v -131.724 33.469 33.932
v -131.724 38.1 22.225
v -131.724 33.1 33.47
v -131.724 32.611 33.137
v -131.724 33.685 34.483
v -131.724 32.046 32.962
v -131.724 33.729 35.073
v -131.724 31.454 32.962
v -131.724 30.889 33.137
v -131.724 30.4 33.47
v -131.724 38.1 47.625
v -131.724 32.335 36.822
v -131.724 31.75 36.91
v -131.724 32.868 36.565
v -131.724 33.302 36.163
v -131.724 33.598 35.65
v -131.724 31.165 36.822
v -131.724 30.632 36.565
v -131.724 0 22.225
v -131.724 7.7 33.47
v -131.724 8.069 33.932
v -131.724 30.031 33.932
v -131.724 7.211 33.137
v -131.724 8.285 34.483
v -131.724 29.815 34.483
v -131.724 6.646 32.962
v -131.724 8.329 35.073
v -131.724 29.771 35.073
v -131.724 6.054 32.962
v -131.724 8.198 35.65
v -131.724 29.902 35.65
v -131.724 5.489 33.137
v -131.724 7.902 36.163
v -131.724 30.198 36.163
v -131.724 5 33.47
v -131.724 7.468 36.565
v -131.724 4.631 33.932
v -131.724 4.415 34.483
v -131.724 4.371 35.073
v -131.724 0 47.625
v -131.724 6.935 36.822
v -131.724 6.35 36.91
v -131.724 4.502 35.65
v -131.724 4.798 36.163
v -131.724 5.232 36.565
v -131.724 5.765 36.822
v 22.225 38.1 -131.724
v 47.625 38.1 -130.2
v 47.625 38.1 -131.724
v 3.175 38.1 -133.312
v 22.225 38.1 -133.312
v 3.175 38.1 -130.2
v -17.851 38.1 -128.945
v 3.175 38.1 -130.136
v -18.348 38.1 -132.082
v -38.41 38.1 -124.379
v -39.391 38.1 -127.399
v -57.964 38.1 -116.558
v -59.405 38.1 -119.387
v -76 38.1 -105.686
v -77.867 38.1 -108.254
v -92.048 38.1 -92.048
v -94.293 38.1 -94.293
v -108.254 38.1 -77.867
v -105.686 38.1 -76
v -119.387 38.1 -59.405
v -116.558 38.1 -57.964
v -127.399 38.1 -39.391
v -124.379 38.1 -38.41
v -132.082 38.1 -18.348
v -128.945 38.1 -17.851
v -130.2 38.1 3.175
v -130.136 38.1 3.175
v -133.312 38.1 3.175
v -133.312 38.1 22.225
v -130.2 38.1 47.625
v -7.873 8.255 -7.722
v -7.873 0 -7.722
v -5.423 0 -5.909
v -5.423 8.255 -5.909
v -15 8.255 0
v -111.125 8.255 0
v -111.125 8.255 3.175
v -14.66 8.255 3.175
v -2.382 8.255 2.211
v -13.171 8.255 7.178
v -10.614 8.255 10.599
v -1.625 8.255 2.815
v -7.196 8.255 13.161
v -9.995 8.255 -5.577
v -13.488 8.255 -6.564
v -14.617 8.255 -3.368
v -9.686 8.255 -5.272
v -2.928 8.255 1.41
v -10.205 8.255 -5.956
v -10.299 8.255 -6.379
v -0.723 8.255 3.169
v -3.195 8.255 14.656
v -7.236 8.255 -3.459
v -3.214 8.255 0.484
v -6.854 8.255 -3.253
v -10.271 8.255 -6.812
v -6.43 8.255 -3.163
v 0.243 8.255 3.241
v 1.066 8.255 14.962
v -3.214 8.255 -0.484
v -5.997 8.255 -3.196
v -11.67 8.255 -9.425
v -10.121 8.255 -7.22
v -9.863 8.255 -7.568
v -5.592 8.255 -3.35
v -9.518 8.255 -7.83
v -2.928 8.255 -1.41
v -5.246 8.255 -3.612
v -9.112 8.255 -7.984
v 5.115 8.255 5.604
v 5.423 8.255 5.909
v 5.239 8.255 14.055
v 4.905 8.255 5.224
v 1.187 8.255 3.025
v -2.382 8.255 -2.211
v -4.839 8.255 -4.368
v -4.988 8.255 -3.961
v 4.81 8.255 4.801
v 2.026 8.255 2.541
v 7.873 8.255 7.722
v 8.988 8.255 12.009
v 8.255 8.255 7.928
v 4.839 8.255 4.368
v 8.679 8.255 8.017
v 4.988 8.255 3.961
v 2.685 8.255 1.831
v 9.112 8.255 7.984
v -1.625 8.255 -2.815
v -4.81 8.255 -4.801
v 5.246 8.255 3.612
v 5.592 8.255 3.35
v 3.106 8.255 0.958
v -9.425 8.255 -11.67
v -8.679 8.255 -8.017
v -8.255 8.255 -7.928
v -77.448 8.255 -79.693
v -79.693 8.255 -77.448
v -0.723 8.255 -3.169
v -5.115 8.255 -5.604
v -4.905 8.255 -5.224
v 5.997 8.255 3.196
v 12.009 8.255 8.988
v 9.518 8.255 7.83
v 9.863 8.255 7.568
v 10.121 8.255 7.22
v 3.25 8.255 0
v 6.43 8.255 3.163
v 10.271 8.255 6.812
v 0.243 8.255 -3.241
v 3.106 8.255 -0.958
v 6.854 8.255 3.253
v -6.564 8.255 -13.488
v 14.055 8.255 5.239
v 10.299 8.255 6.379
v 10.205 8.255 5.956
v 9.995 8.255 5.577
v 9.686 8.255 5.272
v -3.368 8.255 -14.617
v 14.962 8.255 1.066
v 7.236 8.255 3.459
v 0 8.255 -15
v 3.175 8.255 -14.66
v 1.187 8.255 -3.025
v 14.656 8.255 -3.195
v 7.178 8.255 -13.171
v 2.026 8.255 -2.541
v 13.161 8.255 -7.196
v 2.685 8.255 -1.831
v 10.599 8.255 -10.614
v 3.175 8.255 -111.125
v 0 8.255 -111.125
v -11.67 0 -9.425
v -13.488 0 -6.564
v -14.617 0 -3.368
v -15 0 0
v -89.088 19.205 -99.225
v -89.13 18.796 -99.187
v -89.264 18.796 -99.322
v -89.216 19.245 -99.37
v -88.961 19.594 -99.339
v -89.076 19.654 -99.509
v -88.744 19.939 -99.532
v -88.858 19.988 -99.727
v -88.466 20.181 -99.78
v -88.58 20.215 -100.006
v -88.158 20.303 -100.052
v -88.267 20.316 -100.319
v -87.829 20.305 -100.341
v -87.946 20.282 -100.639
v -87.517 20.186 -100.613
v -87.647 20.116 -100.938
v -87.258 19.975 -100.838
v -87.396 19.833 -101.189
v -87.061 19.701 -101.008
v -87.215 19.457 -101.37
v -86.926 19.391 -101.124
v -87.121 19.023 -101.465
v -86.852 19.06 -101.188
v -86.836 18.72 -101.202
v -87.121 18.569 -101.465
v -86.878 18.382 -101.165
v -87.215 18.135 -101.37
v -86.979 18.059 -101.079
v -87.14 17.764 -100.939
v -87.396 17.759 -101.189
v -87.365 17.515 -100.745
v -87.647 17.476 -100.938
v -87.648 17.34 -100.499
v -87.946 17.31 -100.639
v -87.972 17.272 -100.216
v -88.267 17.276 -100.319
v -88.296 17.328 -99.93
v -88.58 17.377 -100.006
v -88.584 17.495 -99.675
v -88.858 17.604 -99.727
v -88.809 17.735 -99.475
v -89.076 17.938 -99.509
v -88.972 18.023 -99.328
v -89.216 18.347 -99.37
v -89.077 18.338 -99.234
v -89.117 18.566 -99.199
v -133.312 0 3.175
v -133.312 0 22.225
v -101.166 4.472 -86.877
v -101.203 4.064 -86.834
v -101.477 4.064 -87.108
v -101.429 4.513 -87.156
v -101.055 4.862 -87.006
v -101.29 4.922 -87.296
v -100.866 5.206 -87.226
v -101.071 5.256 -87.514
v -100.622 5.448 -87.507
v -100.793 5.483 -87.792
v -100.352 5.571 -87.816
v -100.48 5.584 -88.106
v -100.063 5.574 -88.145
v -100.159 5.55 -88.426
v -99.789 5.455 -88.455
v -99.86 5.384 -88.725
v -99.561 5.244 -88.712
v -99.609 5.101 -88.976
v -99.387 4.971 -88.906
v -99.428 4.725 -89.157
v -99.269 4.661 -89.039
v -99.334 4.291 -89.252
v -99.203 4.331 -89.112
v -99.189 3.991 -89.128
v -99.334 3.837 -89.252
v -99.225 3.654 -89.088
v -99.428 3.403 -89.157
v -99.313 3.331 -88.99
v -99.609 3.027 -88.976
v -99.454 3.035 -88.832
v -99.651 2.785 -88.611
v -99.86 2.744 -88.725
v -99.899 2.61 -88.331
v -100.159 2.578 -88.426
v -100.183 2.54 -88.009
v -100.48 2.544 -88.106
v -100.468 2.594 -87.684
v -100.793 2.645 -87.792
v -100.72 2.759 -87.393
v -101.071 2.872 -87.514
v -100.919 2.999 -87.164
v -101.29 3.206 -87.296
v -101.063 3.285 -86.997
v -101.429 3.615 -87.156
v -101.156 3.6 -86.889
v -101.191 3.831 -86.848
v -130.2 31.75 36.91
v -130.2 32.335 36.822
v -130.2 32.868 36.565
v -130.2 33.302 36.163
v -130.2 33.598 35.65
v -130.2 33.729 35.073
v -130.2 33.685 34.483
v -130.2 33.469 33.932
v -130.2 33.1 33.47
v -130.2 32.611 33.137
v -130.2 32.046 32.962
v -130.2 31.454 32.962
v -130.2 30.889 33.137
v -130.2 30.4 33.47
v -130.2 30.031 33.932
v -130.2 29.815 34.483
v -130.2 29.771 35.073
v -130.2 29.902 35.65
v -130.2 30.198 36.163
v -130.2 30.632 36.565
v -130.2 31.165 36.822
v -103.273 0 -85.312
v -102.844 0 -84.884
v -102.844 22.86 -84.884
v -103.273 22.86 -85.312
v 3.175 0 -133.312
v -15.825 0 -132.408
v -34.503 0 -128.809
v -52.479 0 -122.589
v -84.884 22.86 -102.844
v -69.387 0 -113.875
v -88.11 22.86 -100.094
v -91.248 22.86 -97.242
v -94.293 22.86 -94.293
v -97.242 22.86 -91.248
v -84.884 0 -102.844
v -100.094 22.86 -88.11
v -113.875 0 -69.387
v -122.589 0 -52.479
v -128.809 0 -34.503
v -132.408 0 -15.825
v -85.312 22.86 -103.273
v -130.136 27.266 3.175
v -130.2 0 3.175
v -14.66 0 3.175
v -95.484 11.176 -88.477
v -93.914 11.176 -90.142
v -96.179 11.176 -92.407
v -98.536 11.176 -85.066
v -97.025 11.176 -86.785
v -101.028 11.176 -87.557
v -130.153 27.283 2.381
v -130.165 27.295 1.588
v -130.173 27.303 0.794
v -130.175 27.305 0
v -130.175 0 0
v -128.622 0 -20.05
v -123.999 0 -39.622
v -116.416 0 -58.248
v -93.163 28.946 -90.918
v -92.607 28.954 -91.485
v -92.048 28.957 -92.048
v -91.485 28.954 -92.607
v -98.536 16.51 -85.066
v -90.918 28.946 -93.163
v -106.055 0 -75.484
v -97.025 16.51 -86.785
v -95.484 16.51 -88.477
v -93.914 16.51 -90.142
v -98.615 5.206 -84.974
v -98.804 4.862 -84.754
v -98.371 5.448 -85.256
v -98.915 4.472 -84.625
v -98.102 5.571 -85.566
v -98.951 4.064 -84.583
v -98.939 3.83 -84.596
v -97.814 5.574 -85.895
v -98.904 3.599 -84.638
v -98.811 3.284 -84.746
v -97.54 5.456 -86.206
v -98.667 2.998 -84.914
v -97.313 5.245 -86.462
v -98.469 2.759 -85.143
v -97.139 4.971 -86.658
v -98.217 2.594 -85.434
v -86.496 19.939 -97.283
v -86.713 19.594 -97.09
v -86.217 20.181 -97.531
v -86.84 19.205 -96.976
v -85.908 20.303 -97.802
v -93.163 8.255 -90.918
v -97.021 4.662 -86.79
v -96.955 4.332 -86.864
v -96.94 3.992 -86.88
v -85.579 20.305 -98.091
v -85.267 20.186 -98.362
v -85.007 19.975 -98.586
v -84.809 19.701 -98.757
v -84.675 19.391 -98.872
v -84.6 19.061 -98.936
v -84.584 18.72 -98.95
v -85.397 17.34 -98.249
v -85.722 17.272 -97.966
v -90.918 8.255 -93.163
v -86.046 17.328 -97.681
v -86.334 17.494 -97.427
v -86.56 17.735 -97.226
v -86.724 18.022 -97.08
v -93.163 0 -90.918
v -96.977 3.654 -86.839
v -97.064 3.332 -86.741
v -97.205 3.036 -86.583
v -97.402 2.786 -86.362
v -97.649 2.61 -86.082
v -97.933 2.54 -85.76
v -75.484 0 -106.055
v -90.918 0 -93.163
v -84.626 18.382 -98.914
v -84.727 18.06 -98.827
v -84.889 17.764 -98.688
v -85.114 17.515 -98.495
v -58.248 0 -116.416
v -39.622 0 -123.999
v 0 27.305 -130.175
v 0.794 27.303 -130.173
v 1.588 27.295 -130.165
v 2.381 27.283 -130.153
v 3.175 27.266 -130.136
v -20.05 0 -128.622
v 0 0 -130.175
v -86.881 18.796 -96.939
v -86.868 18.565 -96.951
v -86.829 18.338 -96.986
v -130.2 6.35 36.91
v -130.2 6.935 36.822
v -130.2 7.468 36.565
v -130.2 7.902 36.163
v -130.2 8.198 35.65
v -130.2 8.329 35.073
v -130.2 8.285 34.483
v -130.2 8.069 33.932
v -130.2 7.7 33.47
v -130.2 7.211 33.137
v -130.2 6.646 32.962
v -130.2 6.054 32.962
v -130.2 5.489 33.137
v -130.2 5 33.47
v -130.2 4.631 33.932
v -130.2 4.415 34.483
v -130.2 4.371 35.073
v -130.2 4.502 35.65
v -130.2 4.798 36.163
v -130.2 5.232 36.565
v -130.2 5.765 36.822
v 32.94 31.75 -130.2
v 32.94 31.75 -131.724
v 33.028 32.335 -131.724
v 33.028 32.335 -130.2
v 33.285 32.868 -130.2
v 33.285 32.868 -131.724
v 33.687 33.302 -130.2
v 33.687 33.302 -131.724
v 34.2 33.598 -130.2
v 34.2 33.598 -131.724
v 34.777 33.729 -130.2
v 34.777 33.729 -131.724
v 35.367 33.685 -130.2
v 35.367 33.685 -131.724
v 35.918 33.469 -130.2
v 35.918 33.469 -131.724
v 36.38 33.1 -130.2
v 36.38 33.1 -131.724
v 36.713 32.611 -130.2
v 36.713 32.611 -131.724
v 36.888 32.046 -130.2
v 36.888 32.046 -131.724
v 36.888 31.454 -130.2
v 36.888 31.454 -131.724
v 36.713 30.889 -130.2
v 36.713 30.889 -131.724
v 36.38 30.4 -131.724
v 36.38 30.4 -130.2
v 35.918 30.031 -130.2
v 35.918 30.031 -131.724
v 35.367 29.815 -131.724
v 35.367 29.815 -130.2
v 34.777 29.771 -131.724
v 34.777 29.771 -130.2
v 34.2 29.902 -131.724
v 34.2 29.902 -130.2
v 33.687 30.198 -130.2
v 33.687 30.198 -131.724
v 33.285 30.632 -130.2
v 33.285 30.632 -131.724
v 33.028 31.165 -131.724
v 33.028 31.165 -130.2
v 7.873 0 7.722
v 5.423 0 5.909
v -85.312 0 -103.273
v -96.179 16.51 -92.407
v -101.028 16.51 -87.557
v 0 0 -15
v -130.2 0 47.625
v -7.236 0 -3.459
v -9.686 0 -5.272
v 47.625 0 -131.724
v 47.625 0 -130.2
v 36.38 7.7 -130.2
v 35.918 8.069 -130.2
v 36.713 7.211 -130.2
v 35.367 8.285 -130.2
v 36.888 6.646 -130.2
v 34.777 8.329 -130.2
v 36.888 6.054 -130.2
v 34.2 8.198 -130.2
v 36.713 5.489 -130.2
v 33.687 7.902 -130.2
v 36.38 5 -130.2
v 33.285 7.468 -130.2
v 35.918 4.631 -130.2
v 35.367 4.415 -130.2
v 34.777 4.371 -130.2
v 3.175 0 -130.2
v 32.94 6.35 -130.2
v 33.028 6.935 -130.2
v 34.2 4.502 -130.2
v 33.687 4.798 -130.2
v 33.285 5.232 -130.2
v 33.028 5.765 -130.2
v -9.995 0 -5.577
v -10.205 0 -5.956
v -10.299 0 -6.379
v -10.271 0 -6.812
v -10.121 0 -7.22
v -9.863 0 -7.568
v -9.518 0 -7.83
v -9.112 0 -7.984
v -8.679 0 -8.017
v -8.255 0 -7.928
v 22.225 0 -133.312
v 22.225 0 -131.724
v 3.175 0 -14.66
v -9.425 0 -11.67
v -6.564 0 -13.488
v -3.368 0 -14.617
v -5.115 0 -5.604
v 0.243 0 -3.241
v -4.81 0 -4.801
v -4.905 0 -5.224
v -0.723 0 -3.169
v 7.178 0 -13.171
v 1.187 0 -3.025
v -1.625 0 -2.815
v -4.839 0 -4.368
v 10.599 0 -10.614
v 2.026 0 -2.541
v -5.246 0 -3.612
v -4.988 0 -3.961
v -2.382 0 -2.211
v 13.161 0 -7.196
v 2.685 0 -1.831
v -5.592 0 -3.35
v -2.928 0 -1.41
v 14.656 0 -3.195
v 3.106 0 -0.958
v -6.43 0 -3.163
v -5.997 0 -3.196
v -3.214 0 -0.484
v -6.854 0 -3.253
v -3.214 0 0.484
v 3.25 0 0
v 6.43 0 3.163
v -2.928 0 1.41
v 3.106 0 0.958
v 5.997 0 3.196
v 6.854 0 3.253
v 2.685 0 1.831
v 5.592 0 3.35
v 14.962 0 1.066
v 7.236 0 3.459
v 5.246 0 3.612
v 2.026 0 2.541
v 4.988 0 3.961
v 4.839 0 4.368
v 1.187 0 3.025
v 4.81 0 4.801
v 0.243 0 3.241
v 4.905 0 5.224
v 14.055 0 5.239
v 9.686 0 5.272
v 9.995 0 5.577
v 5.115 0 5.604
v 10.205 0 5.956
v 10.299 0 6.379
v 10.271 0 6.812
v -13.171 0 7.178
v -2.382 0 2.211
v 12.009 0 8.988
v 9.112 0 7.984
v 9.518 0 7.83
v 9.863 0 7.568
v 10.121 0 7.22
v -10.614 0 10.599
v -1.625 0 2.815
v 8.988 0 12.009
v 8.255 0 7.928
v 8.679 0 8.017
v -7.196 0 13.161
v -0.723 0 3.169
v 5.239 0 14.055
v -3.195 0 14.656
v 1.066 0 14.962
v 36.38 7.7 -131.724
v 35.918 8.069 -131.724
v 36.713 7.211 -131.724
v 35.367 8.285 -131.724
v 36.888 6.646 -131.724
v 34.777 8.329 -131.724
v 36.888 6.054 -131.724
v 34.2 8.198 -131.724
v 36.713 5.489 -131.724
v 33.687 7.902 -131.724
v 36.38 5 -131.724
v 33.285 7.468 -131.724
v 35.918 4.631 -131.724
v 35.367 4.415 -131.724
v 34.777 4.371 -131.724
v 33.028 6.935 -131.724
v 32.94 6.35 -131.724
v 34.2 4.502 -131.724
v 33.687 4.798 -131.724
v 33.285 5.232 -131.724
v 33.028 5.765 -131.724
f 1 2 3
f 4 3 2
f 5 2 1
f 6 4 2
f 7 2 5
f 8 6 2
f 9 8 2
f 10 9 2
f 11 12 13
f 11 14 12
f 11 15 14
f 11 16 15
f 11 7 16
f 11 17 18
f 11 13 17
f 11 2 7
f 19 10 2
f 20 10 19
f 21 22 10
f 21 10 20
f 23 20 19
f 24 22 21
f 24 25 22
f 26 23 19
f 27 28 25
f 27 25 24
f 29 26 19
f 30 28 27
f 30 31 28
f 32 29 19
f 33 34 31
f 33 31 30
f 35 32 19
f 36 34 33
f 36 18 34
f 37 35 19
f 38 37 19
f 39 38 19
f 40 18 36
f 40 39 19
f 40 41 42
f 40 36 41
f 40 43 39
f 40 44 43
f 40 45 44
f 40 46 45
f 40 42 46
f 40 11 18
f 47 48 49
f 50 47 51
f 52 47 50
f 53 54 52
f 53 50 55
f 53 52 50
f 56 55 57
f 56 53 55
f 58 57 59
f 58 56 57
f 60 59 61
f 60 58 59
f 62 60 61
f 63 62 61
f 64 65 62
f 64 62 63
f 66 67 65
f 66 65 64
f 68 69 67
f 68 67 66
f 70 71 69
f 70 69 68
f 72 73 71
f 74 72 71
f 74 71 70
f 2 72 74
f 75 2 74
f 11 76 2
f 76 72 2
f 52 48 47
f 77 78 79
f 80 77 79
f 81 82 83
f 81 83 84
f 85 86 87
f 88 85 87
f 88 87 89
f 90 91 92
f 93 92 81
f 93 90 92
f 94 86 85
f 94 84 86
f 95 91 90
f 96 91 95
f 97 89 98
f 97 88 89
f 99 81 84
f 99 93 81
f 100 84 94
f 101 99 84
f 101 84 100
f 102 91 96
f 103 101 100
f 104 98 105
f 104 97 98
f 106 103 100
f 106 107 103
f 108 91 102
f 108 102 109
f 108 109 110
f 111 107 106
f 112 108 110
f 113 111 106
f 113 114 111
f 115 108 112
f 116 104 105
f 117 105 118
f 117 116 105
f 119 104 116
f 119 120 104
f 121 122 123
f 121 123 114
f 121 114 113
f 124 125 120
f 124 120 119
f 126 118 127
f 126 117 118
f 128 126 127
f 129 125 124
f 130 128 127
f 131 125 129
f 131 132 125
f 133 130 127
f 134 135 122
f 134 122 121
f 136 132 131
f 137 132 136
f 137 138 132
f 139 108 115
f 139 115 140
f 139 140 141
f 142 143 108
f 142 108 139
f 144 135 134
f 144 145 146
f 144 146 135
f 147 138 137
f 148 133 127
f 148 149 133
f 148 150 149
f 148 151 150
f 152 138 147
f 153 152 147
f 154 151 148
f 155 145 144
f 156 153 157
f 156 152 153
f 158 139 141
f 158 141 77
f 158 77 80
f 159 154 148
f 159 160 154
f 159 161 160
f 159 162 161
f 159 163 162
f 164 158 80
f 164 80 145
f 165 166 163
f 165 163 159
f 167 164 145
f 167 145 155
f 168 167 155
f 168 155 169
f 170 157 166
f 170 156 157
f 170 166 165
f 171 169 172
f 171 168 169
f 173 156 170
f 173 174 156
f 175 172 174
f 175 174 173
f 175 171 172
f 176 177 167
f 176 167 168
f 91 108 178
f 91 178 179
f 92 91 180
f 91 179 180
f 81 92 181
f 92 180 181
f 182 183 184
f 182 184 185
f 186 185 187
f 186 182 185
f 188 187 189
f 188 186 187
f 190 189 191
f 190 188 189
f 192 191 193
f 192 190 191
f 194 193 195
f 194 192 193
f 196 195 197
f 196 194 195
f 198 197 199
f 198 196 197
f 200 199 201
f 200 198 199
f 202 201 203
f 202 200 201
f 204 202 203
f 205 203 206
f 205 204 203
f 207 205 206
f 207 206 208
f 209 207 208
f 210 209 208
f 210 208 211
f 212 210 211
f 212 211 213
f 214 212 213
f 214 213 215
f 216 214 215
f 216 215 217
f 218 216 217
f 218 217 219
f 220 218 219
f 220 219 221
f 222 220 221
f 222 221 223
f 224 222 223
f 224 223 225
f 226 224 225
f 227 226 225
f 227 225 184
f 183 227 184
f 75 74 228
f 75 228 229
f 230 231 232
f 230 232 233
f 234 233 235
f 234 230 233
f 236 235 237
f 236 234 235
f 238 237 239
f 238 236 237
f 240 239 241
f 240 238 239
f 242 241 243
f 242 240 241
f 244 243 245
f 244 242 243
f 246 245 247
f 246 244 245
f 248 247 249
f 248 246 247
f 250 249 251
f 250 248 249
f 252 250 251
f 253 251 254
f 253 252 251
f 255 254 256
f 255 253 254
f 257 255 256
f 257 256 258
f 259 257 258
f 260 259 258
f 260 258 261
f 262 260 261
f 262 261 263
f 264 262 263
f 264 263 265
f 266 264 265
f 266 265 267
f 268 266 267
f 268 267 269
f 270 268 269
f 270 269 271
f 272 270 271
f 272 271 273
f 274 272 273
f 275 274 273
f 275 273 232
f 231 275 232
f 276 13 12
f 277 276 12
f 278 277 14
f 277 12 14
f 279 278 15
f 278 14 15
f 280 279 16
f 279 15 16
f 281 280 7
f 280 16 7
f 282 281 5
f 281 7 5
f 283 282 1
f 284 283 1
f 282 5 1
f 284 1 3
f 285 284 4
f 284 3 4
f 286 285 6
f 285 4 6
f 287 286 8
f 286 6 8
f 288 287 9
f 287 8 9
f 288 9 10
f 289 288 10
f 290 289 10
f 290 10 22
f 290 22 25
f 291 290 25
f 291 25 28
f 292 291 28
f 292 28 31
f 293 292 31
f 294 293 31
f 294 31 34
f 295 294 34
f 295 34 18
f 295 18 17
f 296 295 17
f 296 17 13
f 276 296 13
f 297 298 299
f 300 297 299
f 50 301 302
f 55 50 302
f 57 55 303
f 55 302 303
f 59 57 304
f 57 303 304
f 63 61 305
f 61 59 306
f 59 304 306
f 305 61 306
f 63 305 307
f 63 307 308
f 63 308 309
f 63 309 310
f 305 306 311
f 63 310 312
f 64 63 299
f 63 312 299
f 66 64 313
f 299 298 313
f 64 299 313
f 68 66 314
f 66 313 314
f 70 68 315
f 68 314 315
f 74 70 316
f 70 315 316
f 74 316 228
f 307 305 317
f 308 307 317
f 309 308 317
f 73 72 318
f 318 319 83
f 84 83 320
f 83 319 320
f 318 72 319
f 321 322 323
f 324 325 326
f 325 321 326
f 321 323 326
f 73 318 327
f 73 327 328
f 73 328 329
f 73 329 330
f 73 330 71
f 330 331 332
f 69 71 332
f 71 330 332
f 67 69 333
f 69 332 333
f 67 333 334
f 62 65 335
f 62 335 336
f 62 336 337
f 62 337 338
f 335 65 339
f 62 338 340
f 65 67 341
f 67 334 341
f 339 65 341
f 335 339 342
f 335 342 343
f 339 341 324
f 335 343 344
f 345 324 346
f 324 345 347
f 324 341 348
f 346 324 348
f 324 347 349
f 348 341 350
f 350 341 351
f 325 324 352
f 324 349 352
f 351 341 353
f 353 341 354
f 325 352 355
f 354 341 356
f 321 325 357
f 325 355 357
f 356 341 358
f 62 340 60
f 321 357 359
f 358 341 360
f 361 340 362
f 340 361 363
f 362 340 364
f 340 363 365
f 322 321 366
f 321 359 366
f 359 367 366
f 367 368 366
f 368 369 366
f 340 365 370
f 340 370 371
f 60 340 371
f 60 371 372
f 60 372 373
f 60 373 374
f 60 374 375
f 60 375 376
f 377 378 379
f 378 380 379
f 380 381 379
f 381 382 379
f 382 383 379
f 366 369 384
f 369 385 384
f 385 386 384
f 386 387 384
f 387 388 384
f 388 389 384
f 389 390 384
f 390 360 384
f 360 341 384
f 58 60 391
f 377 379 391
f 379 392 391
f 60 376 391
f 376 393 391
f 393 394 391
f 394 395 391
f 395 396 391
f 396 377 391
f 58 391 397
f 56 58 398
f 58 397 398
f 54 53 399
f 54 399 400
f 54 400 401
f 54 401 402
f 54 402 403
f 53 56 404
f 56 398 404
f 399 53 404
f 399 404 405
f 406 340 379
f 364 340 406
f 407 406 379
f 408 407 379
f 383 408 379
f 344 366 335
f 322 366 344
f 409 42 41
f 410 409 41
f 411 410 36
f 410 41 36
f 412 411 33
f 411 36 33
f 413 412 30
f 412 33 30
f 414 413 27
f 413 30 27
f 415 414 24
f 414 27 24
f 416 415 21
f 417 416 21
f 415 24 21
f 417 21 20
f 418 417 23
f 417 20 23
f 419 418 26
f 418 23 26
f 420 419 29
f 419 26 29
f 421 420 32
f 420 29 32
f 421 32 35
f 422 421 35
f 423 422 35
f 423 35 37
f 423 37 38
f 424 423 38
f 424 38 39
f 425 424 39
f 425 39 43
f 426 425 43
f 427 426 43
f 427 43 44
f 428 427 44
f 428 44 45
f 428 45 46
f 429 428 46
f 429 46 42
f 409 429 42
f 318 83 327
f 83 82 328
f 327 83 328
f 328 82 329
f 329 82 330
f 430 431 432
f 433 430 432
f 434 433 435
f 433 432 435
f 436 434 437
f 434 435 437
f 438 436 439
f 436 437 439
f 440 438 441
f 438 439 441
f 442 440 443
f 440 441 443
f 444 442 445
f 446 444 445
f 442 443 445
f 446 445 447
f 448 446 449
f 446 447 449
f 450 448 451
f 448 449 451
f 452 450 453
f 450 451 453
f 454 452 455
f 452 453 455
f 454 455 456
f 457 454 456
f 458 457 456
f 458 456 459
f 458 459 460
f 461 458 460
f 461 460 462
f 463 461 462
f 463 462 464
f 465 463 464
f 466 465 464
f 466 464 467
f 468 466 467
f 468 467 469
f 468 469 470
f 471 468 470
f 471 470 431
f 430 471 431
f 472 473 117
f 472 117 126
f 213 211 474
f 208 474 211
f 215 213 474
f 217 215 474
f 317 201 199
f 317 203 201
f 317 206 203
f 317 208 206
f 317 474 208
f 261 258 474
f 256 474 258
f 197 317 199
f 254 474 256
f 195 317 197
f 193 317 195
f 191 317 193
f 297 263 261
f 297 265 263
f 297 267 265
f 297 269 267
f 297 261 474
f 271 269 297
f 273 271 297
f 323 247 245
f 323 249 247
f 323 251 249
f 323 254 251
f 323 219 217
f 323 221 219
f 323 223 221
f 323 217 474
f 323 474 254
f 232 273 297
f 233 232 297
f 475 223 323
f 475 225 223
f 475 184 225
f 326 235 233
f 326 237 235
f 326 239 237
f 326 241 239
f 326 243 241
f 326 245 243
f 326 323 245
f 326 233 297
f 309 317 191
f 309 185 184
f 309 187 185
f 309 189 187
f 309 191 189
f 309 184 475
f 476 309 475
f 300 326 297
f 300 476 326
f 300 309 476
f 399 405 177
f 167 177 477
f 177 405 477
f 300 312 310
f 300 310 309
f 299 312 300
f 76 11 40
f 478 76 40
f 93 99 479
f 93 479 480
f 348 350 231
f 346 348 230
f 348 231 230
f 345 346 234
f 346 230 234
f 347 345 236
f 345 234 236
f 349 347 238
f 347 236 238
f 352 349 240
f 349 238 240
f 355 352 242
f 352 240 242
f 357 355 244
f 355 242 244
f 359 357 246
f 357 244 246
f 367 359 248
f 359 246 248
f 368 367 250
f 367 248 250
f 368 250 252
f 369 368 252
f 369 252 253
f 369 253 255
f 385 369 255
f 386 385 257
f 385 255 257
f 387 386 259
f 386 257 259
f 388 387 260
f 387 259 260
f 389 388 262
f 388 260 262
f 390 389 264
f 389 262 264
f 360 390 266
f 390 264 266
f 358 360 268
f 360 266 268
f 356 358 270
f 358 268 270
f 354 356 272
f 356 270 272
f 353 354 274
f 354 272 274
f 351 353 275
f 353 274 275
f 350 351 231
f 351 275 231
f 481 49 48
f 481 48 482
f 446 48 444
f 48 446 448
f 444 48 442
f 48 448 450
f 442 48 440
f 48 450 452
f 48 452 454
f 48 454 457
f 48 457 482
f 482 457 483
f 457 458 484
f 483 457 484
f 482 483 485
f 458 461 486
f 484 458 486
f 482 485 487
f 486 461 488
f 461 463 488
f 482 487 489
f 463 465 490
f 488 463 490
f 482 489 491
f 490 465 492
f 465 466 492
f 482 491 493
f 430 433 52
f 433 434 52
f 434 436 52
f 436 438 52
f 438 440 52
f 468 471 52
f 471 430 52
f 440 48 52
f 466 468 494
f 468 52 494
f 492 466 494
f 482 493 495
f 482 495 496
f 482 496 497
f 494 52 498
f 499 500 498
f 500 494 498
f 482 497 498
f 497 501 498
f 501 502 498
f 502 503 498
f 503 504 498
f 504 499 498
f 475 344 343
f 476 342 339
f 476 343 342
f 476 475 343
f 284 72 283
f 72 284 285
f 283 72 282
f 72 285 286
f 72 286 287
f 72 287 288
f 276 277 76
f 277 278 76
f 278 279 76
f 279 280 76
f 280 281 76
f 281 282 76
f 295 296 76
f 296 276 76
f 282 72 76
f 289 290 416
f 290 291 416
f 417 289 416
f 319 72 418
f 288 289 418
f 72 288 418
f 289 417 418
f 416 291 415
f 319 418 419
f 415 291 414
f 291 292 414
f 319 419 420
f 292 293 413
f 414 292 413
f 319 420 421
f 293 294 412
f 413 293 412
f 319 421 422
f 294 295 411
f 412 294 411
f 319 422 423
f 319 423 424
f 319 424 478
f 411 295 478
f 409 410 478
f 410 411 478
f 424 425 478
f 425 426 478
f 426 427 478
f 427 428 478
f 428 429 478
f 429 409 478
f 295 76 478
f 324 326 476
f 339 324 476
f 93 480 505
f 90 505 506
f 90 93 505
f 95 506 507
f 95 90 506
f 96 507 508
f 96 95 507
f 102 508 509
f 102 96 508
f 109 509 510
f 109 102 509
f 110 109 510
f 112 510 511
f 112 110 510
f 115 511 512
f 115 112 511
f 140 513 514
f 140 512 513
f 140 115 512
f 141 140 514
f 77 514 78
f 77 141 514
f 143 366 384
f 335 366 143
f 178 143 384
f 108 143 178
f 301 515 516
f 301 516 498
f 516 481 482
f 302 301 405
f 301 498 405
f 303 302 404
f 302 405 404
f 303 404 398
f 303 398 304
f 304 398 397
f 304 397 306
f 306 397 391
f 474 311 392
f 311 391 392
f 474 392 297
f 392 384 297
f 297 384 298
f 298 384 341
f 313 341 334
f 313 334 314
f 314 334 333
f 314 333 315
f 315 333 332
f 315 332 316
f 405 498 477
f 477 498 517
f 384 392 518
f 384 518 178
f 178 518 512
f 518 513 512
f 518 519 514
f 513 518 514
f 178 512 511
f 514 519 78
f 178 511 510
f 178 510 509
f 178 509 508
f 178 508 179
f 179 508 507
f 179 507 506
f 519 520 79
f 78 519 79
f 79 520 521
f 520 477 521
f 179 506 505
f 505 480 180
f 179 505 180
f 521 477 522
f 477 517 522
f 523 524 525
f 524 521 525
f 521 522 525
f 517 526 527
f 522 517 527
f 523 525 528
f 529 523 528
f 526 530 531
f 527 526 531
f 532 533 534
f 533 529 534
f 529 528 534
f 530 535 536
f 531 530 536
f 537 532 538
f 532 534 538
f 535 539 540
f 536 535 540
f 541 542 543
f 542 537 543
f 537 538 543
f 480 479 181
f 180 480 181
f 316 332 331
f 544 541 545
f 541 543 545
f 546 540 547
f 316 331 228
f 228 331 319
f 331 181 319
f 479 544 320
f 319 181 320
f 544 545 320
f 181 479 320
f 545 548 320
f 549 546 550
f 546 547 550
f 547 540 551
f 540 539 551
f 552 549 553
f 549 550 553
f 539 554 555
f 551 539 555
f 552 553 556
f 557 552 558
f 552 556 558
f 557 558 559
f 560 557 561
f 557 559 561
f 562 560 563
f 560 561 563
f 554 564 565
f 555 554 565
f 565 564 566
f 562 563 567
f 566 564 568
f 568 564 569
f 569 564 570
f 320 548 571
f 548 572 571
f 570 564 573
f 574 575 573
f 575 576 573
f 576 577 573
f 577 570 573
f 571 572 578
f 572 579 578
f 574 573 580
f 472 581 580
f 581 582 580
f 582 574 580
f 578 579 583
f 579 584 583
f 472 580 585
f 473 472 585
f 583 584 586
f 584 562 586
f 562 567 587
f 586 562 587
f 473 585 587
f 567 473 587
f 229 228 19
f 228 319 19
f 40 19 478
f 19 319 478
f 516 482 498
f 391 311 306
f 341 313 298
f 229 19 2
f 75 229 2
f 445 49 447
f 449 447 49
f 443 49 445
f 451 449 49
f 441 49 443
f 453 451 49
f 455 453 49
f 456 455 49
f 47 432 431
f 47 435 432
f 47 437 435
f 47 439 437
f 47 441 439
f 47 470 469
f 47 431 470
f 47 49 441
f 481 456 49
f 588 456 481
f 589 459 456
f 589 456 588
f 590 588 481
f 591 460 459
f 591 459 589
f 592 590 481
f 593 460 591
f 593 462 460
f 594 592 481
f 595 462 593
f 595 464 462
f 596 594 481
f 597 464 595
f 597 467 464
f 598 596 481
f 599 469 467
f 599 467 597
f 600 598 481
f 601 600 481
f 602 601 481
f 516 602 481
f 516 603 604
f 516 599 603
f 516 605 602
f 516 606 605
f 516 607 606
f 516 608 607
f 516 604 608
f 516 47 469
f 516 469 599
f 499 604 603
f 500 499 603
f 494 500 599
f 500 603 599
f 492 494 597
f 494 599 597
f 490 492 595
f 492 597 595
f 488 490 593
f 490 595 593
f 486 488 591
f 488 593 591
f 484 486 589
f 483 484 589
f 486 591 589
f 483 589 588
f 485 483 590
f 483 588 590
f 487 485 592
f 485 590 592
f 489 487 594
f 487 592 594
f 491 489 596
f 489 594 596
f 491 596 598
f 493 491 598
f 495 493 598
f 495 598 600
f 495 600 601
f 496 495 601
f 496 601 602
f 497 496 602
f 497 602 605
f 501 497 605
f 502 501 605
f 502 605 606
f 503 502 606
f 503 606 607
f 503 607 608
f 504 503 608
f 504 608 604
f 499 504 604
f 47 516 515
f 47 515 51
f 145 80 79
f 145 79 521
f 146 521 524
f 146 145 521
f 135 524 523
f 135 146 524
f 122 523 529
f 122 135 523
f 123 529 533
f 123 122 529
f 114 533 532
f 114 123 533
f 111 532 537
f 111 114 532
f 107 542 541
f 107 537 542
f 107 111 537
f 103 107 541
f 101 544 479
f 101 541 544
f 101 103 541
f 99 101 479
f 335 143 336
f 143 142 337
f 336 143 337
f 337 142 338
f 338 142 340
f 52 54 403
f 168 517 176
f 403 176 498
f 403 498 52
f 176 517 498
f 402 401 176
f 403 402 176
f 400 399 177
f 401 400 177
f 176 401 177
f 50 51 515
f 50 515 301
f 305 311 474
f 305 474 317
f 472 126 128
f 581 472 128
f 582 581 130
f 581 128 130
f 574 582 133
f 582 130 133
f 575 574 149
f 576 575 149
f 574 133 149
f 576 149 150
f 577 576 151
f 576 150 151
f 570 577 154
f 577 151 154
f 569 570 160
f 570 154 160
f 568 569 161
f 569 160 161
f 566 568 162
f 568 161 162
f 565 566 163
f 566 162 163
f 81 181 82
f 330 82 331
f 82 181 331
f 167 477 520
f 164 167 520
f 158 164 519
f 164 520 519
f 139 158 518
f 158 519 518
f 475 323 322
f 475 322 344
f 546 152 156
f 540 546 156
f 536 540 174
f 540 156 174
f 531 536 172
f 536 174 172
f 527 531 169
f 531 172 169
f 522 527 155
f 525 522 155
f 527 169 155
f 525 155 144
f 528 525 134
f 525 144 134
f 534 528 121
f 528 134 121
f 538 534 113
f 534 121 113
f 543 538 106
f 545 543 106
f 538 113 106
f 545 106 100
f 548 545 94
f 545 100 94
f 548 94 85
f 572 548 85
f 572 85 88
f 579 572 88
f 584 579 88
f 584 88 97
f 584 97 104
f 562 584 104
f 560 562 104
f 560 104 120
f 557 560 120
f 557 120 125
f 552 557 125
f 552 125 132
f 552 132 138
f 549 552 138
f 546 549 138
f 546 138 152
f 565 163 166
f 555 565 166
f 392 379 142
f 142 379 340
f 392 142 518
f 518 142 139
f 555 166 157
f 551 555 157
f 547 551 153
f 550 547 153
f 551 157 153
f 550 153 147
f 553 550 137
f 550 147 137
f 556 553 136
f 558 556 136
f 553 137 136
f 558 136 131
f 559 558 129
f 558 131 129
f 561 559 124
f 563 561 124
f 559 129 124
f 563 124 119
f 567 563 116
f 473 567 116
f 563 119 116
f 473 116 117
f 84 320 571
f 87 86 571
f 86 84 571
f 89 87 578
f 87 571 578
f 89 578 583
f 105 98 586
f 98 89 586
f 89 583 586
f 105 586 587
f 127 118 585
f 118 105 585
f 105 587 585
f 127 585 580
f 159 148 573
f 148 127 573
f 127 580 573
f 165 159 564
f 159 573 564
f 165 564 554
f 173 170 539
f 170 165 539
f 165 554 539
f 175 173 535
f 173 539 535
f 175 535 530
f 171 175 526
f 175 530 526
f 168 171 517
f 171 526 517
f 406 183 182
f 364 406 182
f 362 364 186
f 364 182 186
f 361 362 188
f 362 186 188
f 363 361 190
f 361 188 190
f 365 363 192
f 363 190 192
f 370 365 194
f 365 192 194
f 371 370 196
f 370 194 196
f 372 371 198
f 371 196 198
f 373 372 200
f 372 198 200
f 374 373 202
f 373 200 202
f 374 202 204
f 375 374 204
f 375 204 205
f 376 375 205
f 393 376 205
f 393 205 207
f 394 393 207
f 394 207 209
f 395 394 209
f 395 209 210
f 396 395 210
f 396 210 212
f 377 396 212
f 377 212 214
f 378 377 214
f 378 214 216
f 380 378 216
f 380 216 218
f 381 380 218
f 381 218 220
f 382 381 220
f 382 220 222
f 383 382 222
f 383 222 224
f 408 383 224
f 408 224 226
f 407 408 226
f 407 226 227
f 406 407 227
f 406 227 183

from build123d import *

# Parameters (mm, degrees)
SKETCH1_R            = 15
BOSS_EXTRUDE2_DEPTH  = 8.255
BOSS_EXTRUDE3_DEPTH  = 8.255
BOSS_EXTRUDE4_DEPTH  = 38.1
SKETCH5_R            = 3.249999977
CUT_EXTRUDE3_DEPTH   = 63.5
BOSS_EXTRUDE9_DEPTH  = 3.175
BOSS_EXTRUDE11_DEPTH = 3.175
BOSS_EXTRUDE14_DEPTH = 3.175
SKETCH15_W           = 38.1
SKETCH15_H           = 44.45
BOSS_EXTRUDE15_DEPTH = 1.524
SKETCH16_W           = 38.1
SKETCH16_H           = 44.45
BOSS_EXTRUDE16_DEPTH = 1.524
SKETCH17_R           = 1.98501
CUT_EXTRUDE4_DEPTH   = 2.54
SKETCH18_R           = 1.98501
CUT_EXTRUDE5_DEPTH   = 2.54
SKETCH19_W           = 19.05
SKETCH19_H           = 38.1
BOSS_EXTRUDE17_DEPTH = 1.587961
SKETCH20_W           = 19.05
SKETCH20_H           = 38.1
BOSS_EXTRUDE18_DEPTH = 1.587961
CUT_EXTRUDE6_REACH   = 202.702
SKETCH21_R           = 1.524
BOSS_EXTRUDE20_START = -0.60614
SKETCH21_3_W         = 25.4
SKETCH21_3_H         = 22.86
SKETCH21_3_R         = 1.524
BOSS_EXTRUDE20_DEPTH = 0.60614
CUT_EXTRUDE7_REACH   = 202.702
SKETCH26_W           = 6.858
SKETCH26_H           = 5.334


with BuildPart() as part:
    # Sketch1 → Boss-Extrude2 (new body)
    with BuildSketch(Plane(origin=(0, 0, 0), x_dir=(1, 0, 0), z_dir=(0, 1, 0))):
        Circle(SKETCH1_R)
    extrude(amount=BOSS_EXTRUDE2_DEPTH)

    # Sketch1<6> → Boss-Extrude3 (add)
    with BuildSketch(Plane(origin=(0, 0, 0), x_dir=(1, 0, 0), z_dir=(0, 1, 0))):
        with BuildLine():
            ThreePointArc((3.175, 130.136274728), (1.587618078, 130.165318322), (0, 130.175))
            Line((0, 130.175), (0, 15))
            ThreePointArc((0, 15), (1.596569562, 14.914790164), (3.175, 14.660128751))
            Line((3.175, 14.660128751), (3.175, 130.136274728))
        make_face()
        with BuildLine():
            Line((-9.42450178, 11.66956581), (-90.918248264, 93.163312294))
            ThreePointArc((-90.918248264, 93.163312294), (-92.047625241, 92.047625241), (-93.163312294, 90.918248264))
            Line((-93.163312294, 90.918248264), (-11.66956581, 9.42450178))
            ThreePointArc((-11.66956581, 9.42450178), (-10.606601718, 10.606601718), (-9.42450178, 11.66956581))
        make_face()
        with BuildLine():
            Line((-15, 0), (-130.175, 0))
            ThreePointArc((-130.175, 0), (-130.165318322, -1.587618078), (-130.136274728, -3.175))
            Line((-130.136274728, -3.175), (-14.660128751, -3.175))
            ThreePointArc((-14.660128751, -3.175), (-14.914790164, -1.596569562), (-15, 0))
        make_face()
    extrude(amount=BOSS_EXTRUDE3_DEPTH)

    # Sketch1<7> → Boss-Extrude4 (add)
    with BuildSketch(Plane(origin=(0, 0, 0), x_dir=(1, 0, 0), z_dir=(0, 1, 0))):
        with BuildLine():
            Line((3.175, 130.136274728), (3.175, 133.312197023))
            ThreePointArc((3.175, 133.312197023), (-94.292689271, 94.292689271), (-133.312197023, -3.175))
            Line((-133.312197023, -3.175), (-130.136274728, -3.175))
            ThreePointArc((-130.136274728, -3.175), (-92.047625241, 92.047625241), (3.175, 130.136274728))
        make_face()
    extrude(amount=BOSS_EXTRUDE4_DEPTH)

    # Sketch5 → Cut-Extrude3 (cut)
    with BuildSketch(Plane(origin=(0, 8.255, 0), x_dir=(1, 0, 0), z_dir=(0, 1, 0))):
        Circle(SKETCH5_R)
        with BuildLine():
            Line((-7.236078848, 3.458556767), (-9.686234559, 5.271576621))
            ThreePointArc((-9.686234559, 5.271576621), (-10.004802487, 7.403164404), (-7.873214705, 7.721732332))
            Line((-7.873214705, 7.721732332), (-5.423058993, 5.908712478))
            ThreePointArc((-5.423058993, 5.908712478), (-5.104491065, 3.777124696), (-7.236078848, 3.458556767))
        make_face()
        with BuildLine():
            Line((5.423058993, -5.908712478), (7.873214705, -7.721732332))
            ThreePointArc((7.873214705, -7.721732332), (10.004802487, -7.403164404), (9.686234559, -5.271576621))
            Line((9.686234559, -5.271576621), (7.236078848, -3.458556767))
            ThreePointArc((7.236078848, -3.458556767), (5.104491065, -3.777124696), (5.423058993, -5.908712478))
        make_face()
    extrude(amount=-CUT_EXTRUDE3_DEPTH, mode=Mode.SUBTRACT)

    # Sketch10 → Boss-Extrude9 (add)
    with BuildSketch(Plane(origin=(0, 0, 0), x_dir=(-1, 0, 0), z_dir=(0, 0, -1))):
        Polygon((130.175, 27.305), (130.175, 8.255), (111.125, 8.255), align=None)
    extrude(amount=-BOSS_EXTRUDE9_DEPTH)

    # Sketch13 → Boss-Extrude11 (add)
    with BuildSketch(Plane.ZY):
        Polygon((-130.175, 27.305), (-111.125, 8.255), (-130.175, 8.255), align=None)
    extrude(amount=-BOSS_EXTRUDE11_DEPTH)

    # Sketch14 → Boss-Extrude14 (add)
    with BuildSketch(Plane(origin=(1.122532015, 0, -1.122532015), x_dir=(-0.707106781, 0, -0.707106781), z_dir=(0.707106781, 0, -0.707106781))):
        Polygon((133.340319762, 8.255), (111.115319762, 8.255), (133.340319762, 32.394680238), align=None)
    extrude(amount=-BOSS_EXTRUDE14_DEPTH)

    # Sketch15 → Boss-Extrude15 (add)
    with BuildSketch(Plane(origin=(-131.724235875, 0, 0), x_dir=(0, -1, 0), z_dir=(-1, 0, 0))):
        with Locations((-19.05, 25.4)):
            Rectangle(SKETCH15_W, SKETCH15_H)
    extrude(amount=-BOSS_EXTRUDE15_DEPTH)

    # Sketch16 → Boss-Extrude16 (add)
    with BuildSketch(Plane(origin=(0, 0, -131.724235875), x_dir=(0, -1, 0), z_dir=(0, 0, -1))):
        with Locations((-19.05, -25.4)):
            Rectangle(SKETCH16_W, SKETCH16_H)
    extrude(amount=-BOSS_EXTRUDE16_DEPTH)

    # Sketch17 → Cut-Extrude4 (cut)
    with BuildSketch(Plane(origin=(0, 0, -131.724235875), x_dir=(-1, 0, 0), z_dir=(0, 0, -1))):
        with Locations((-34.925, 31.75)):
            Circle(SKETCH17_R)
        with Locations((-34.925, 6.35)):
            Circle(SKETCH17_R)
    extrude(amount=-CUT_EXTRUDE4_DEPTH, mode=Mode.SUBTRACT)

    # Sketch18 → Cut-Extrude5 (cut)
    with BuildSketch(Plane.ZY.offset(131.724235875)):
        with Locations((34.925, 31.75)):
            Circle(SKETCH18_R)
        with Locations((34.925, 6.35)):
            Circle(SKETCH18_R)
    extrude(amount=-CUT_EXTRUDE5_DEPTH, mode=Mode.SUBTRACT)

    # Sketch19 → Boss-Extrude17 (add)
    with BuildSketch(Plane.ZY.offset(131.724235875)):
        with Locations((12.7, 19.05)):
            Rectangle(SKETCH19_W, SKETCH19_H)
    extrude(amount=BOSS_EXTRUDE17_DEPTH)

    # Sketch20 → Boss-Extrude18 (add)
    with BuildSketch(Plane(origin=(0, 0, -131.724235875), x_dir=(-1, 0, 0), z_dir=(0, 0, -1))):
        with Locations((-12.7, 19.05)):
            Rectangle(SKETCH20_W, SKETCH20_H)
    extrude(amount=BOSS_EXTRUDE18_DEPTH)

    # Sketch21 → Cut-Extrude6 (cut, up to next)
    with BuildSketch(Plane(origin=(-94.292689271, 0, -94.292689271), x_dir=(-0.707106781, 0, 0.707106781), z_dir=(-0.707106781, 0, -0.707106781)), mode=Mode.PRIVATE) as cut_extrude6_sk1:
        with Locations((8.636, 4.064)):
            Circle(SKETCH21_R)
    cut_extrude6_tool1 = extrude(cut_extrude6_sk1.sketch, amount=-CUT_EXTRUDE6_REACH, mode=Mode.PRIVATE) & part.part
    add(cut_extrude6_tool1.solids().sort_by_distance((-100.399263, 4.064, -88.186115))[0], mode=Mode.SUBTRACT)
    # Sketch21 → Cut-Extrude6 (cut, up to next)
    with BuildSketch(Plane(origin=(-94.292689271, 0, -94.292689271), x_dir=(-0.707106781, 0, 0.707106781), z_dir=(-0.707106781, 0, -0.707106781)), mode=Mode.PRIVATE) as cut_extrude6_sk2:
        with Locations((-8.636, 18.796)):
            Circle(SKETCH21_R)
    cut_extrude6_tool2 = extrude(cut_extrude6_sk2.sketch, amount=-CUT_EXTRUDE6_REACH, mode=Mode.PRIVATE) & part.part
    add(cut_extrude6_tool2.solids().sort_by_distance((-88.186115, 18.796, -100.399263))[0], mode=Mode.SUBTRACT)

    # Sketch21<3> → Boss-Extrude20 (add)
    with BuildSketch(Plane(origin=(-94.292689271, 0, -94.292689271), x_dir=(-0.707106781, 0, 0.707106781), z_dir=(-0.707106781, 0, -0.707106781)).offset(BOSS_EXTRUDE20_START)):
        with Locations((0, 11.43)):
            Rectangle(SKETCH21_3_W, SKETCH21_3_H)
        with Locations((8.636, 4.064)):
            Circle(SKETCH21_3_R, mode=Mode.SUBTRACT)
        with Locations((-8.636, 18.796)):
            Circle(SKETCH21_3_R, mode=Mode.SUBTRACT)
    extrude(amount=BOSS_EXTRUDE20_DEPTH)

    # Sketch26 → Cut-Extrude7 (cut, up to next)
    with BuildSketch(Plane(origin=(-94.292689271, 0, -94.292689271), x_dir=(-0.707106781, 0, 0.707106781), z_dir=(-0.707106781, 0, -0.707106781)), mode=Mode.PRIVATE) as cut_extrude7_sk1:
        with Locations((6.096, 13.843)):
            Rectangle(SKETCH26_W, SKETCH26_H)
    cut_extrude7_tool1 = extrude(cut_extrude7_sk1.sketch, amount=-CUT_EXTRUDE7_REACH, mode=Mode.PRIVATE) & part.part
    add(cut_extrude7_tool1.solids().sort_by_distance((-98.603212, 13.843, -89.982166))[0], mode=Mode.SUBTRACT)


solid = part.part
